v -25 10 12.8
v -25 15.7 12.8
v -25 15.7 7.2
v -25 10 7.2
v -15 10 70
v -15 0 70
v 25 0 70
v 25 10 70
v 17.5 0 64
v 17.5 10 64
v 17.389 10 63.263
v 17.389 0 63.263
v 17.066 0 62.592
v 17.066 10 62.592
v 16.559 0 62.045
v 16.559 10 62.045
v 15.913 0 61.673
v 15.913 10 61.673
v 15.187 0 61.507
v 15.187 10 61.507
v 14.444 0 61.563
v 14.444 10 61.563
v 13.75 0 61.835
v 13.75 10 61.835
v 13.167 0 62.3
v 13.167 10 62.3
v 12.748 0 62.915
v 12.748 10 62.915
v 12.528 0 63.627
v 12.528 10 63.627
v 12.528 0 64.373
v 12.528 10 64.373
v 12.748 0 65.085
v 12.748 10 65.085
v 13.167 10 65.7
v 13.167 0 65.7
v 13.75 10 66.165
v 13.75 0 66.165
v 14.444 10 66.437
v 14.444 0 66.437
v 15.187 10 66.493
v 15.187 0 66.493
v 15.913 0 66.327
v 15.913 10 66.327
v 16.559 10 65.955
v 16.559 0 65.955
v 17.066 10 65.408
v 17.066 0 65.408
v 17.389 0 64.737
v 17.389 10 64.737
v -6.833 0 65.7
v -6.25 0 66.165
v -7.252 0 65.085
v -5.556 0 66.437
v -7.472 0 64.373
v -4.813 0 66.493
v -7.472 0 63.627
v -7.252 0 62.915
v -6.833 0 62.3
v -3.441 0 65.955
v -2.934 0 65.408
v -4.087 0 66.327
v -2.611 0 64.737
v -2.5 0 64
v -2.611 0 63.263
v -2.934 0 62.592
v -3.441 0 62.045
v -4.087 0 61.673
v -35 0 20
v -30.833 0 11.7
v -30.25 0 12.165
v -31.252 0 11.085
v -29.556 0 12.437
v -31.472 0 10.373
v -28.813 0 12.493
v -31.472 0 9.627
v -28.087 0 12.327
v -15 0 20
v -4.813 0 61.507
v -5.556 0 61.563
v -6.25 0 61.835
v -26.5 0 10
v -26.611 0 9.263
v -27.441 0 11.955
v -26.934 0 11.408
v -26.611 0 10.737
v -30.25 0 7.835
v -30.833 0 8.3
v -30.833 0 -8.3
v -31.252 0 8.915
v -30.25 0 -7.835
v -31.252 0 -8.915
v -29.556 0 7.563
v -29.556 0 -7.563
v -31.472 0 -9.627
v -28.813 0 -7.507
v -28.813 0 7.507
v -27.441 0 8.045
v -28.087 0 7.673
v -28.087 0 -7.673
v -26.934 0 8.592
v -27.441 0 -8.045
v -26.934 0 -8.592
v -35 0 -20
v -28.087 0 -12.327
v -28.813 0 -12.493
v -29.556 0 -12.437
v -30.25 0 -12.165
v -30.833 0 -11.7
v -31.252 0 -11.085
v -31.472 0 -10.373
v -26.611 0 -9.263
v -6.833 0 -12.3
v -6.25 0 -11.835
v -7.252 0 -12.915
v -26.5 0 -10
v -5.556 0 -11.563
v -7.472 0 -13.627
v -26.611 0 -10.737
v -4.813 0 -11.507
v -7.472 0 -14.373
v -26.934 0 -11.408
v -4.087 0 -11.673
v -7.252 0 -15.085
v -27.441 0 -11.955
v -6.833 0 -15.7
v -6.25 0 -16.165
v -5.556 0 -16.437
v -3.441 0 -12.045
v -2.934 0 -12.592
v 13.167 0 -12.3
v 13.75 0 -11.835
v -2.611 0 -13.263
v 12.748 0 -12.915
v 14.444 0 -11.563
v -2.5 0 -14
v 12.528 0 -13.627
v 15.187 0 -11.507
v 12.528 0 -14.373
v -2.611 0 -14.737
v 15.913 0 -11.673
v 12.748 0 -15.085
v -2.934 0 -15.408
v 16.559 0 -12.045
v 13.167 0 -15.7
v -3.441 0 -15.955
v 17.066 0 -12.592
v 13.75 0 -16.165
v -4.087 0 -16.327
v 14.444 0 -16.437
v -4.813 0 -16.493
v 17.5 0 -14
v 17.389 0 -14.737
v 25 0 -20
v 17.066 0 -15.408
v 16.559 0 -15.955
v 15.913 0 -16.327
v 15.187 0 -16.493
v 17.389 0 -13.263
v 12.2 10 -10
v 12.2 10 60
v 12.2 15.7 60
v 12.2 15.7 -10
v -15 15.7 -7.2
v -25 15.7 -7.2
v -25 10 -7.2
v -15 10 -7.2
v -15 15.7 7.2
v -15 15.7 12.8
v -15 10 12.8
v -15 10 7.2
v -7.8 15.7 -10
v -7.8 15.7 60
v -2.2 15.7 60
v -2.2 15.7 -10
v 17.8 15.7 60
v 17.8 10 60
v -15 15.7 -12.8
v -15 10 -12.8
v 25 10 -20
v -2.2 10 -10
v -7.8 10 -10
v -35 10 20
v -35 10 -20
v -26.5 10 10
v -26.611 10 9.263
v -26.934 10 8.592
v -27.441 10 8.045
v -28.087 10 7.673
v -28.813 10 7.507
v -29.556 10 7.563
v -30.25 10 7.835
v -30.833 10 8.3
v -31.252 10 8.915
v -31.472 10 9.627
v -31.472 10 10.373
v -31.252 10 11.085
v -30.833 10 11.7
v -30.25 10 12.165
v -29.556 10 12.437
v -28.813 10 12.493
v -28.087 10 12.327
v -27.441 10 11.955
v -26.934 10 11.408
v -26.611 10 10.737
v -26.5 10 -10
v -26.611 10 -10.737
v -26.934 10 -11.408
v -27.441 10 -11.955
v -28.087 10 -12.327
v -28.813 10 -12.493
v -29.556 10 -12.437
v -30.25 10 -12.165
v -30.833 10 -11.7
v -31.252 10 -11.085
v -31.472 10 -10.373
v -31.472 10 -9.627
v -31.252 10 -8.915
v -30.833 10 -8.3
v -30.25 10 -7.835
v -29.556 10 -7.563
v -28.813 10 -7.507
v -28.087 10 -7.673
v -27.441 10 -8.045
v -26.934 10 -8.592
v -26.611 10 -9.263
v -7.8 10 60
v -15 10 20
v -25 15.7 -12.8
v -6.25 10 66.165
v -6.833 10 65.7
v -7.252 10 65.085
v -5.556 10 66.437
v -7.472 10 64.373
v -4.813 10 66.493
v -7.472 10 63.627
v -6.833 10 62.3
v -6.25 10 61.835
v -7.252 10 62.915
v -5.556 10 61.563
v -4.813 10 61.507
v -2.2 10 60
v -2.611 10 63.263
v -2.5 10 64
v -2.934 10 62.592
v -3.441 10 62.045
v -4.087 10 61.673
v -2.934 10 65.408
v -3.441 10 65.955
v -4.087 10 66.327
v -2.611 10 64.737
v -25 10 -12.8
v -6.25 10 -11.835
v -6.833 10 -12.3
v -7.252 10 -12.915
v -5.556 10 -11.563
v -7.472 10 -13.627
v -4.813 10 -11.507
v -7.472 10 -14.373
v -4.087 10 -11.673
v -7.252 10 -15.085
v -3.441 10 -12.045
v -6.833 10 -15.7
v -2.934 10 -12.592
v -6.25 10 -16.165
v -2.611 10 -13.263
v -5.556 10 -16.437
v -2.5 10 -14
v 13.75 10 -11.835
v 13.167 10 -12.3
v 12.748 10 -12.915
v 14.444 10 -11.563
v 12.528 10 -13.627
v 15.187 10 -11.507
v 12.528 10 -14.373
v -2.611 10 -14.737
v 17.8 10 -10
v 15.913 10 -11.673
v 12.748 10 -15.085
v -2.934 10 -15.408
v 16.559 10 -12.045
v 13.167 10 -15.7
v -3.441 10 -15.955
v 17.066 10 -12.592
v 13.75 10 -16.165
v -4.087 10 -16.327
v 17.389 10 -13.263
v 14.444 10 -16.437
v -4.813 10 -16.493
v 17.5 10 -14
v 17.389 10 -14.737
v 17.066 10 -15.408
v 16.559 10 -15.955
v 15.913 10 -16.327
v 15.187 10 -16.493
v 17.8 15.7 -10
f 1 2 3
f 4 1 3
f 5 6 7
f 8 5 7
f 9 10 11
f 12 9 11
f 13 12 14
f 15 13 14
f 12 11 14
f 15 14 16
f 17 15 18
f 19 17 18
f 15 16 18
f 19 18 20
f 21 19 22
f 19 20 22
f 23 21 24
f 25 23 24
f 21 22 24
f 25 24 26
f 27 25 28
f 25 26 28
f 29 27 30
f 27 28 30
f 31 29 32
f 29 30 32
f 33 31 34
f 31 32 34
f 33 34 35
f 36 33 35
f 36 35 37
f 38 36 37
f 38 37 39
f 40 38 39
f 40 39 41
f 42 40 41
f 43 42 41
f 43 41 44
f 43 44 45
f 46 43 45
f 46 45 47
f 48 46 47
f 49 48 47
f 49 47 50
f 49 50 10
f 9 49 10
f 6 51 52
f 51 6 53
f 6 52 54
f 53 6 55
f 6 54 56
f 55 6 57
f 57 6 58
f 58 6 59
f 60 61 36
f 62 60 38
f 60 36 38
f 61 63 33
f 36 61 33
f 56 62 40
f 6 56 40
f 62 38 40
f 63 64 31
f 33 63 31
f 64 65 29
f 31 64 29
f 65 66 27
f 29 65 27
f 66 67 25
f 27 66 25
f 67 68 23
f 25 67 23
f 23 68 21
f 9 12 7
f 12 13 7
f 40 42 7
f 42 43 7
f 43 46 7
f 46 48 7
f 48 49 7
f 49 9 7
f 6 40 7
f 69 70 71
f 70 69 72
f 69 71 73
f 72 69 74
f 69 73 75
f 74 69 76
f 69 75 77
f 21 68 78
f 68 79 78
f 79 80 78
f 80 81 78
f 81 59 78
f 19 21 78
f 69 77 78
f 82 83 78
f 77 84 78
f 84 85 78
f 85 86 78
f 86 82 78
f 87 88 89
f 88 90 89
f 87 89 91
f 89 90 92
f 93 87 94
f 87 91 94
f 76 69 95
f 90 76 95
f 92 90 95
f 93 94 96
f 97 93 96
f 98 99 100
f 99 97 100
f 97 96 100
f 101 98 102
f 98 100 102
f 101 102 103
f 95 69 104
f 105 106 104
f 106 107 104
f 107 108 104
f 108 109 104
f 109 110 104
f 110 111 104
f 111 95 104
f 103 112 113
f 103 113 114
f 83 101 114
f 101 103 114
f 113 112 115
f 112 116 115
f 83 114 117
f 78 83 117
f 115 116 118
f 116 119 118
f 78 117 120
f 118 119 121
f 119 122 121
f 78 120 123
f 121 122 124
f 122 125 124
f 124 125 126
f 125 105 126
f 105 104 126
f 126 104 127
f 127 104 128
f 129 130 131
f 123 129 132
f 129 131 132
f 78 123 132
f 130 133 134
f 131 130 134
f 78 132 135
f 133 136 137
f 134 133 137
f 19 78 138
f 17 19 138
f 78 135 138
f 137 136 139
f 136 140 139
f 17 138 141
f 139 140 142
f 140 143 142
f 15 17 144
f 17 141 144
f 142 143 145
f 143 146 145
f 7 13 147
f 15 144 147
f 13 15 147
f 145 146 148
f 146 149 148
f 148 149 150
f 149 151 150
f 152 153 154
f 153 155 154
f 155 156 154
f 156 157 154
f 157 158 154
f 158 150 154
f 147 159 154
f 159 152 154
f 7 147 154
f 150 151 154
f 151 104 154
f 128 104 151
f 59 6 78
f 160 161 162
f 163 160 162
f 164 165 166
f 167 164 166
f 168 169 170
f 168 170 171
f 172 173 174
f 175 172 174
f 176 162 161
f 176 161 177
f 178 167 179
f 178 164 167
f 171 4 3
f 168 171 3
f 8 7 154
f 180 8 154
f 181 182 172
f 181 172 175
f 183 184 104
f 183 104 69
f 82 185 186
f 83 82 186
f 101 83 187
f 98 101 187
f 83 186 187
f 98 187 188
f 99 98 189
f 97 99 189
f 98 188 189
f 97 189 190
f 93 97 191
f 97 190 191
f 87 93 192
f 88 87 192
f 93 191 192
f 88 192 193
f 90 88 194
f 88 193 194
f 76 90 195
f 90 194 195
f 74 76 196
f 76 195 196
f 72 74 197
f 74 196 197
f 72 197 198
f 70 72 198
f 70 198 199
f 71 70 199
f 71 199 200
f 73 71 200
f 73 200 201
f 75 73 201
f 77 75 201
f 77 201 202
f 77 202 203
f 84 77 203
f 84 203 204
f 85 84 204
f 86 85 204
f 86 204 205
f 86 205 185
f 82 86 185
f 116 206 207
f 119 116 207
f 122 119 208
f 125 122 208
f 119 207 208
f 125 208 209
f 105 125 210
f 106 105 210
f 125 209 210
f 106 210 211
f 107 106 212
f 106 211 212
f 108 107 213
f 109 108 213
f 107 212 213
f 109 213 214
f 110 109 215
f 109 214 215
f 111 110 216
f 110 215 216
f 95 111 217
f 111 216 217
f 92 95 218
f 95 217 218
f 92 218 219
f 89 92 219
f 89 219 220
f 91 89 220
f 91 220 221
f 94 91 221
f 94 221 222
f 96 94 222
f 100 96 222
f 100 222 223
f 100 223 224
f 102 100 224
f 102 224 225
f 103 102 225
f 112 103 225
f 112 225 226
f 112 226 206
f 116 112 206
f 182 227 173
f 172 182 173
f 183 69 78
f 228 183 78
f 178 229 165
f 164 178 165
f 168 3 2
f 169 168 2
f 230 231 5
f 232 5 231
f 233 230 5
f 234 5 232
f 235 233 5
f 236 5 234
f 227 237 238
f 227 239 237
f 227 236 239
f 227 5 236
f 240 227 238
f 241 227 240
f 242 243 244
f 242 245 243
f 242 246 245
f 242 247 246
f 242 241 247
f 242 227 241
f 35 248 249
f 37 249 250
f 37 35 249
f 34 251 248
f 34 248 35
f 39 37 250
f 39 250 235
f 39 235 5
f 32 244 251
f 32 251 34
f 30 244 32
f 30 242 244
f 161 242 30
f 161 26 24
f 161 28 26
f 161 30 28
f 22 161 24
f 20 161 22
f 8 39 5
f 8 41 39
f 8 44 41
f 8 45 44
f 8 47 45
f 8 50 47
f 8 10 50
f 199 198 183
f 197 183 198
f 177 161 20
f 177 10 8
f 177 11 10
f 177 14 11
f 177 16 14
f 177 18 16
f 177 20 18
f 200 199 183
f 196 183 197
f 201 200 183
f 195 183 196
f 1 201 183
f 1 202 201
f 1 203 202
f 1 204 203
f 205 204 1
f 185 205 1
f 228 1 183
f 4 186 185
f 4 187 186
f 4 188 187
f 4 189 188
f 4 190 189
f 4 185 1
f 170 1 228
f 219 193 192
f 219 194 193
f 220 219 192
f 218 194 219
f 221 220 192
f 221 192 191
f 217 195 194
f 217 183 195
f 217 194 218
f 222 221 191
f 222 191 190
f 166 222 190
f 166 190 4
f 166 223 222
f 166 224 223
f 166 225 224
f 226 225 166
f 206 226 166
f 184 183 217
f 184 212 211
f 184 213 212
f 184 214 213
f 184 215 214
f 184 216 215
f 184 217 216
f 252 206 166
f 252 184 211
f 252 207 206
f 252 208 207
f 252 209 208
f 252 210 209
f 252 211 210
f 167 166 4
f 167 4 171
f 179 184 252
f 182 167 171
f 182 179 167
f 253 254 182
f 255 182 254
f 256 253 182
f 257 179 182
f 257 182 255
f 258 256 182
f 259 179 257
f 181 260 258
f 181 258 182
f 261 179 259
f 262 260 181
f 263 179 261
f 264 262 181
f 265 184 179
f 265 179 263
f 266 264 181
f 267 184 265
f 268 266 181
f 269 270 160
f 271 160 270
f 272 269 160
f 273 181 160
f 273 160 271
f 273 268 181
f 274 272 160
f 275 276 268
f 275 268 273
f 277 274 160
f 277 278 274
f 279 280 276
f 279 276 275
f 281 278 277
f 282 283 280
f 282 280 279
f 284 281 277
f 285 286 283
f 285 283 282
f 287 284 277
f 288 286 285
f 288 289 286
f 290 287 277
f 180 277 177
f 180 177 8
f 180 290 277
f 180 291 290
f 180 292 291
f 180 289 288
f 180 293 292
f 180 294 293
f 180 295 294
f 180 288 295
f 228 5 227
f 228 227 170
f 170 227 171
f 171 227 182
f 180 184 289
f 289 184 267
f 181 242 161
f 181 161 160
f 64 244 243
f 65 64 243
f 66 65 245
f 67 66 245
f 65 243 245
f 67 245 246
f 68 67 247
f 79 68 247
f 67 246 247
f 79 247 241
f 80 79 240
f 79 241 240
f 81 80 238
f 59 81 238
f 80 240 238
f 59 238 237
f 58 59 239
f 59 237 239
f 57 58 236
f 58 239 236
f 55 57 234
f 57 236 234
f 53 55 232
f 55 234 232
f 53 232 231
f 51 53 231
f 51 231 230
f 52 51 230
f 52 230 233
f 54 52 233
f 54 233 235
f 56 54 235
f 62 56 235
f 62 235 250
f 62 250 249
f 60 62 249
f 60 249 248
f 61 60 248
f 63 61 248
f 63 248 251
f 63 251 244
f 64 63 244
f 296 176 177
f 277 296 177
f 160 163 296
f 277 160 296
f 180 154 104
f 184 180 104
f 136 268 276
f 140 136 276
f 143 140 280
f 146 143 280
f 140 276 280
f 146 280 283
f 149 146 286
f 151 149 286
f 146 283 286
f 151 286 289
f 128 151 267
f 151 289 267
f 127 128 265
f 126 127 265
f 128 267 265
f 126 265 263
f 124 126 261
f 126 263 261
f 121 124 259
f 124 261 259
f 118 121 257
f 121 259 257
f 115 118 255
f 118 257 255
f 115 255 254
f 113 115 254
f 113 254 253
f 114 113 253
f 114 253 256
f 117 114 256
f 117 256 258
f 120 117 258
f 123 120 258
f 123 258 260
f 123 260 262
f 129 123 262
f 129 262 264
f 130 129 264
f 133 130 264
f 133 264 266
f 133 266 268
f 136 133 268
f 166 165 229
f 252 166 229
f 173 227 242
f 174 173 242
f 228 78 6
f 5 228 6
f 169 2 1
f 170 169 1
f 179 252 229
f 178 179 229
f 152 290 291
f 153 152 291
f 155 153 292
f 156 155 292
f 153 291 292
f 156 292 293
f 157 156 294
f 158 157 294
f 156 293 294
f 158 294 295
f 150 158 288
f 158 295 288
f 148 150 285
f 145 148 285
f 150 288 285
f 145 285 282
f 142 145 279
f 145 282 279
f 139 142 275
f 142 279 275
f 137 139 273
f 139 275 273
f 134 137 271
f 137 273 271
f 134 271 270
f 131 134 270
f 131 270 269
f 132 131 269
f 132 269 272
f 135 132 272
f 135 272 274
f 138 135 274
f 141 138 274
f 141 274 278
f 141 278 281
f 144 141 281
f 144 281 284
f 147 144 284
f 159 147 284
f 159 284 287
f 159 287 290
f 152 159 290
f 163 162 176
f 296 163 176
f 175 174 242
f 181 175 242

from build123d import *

# Parameters (mm, degrees)
SALIENTE_EXTRUIR1_DEPTH = 10
SALIENTE_EXTRUIR2_DEPTH = 90
SALIENTE_EXTRUIR3_DEPTH = 50
CROQUIS6_W              = 56.928573576
CROQUIS6_H              = 55.923287038
CORTAR_EXTRUIR2_DEPTH   = 30
CROQUIS5_W              = 40
CROQUIS5_H              = 10
CROQUIS5_W_2            = 10
CROQUIS5_H_2            = 40
CORTAR_EXTRUIR1_DEPTH   = 5.7
CROQUIS7_R              = 2.5
CORTAR_EXTRUIR3_DEPTH   = 11


with BuildPart() as part:
    # Croquis1 → Saliente-Extruir1 (new body)
    with BuildSketch(Plane(origin=(0, 0, 0), x_dir=(1, 0, 0), z_dir=(0, 1, 0))):
        Polygon((25, 20), (-65, 20), (-65, -20), (-15, -20), (-15, -70), (25, -70), (25, -20), align=None)
    extrude(amount=SALIENTE_EXTRUIR1_DEPTH)

    # Croquis2 → Saliente-Extruir2 (add, through all)
    with BuildSketch(Plane.XY.offset(70)):
        Polygon((12.2, 9.987376579), (12.2, 15.7), (17.8, 15.7), (17.8, 9.987376579), (15, 9.987376579), align=None)
        Polygon((-7.8, 9.987376579), (-7.8, 15.7), (-2.2, 15.7), (-2.2, 9.987376579), (-5, 9.987376579), align=None)
    extrude(amount=-SALIENTE_EXTRUIR2_DEPTH)

    # Croquis3 → Saliente-Extruir3 (add)
    with BuildSketch(Plane.ZY.offset(65)):
        Polygon((7.2, 10), (7.2, 15.7), (12.8, 15.7), (12.8, 10), (10, 10), align=None)
        Polygon((-12.8, 10), (-12.8, 15.7), (-7.2, 15.7), (-7.2, 10), (-10, 10), align=None)
    extrude(amount=-SALIENTE_EXTRUIR3_DEPTH)

    # Croquis6 → Cortar-Extruir2 (cut)
    with BuildSketch(Plane.ZY.offset(65)):
        Rectangle(CROQUIS6_W, CROQUIS6_H)
    extrude(amount=-CORTAR_EXTRUIR2_DEPTH, mode=Mode.SUBTRACT)

    # Croquis5 → Cortar-Extruir1 (cut)
    with BuildSketch(Plane(origin=(0, 15.7, 0), x_dir=(1, 0, 0), z_dir=(0, 1, 0))):
        with Locations((5, -65)):
            Rectangle(CROQUIS5_W, CROQUIS5_H)
        with Locations((5, 15)):
            Rectangle(CROQUIS5_W, CROQUIS5_H)
        with Locations((-30, 0)):
            Rectangle(CROQUIS5_W_2, CROQUIS5_H_2)
    extrude(amount=-CORTAR_EXTRUIR1_DEPTH, mode=Mode.SUBTRACT)

    # Croquis7 → Cortar-Extruir3 (cut, through all)
    with BuildSketch(Plane(origin=(0, 10, 0), x_dir=(1, 0, 0), z_dir=(0, 1, 0))):
        with Locations((-29, 10)):
            Circle(CROQUIS7_R)
        with Locations((-29, -10)):
            Circle(CROQUIS7_R)
        with Locations((15, 14)):
            Circle(CROQUIS7_R)
        with Locations((-5, 14)):
            Circle(CROQUIS7_R)
        with Locations((-5, -64)):
            Circle(CROQUIS7_R)
        with Locations((15, -64)):
            Circle(CROQUIS7_R)
    extrude(amount=-CORTAR_EXTRUIR3_DEPTH, mode=Mode.SUBTRACT)


solid = part.part
